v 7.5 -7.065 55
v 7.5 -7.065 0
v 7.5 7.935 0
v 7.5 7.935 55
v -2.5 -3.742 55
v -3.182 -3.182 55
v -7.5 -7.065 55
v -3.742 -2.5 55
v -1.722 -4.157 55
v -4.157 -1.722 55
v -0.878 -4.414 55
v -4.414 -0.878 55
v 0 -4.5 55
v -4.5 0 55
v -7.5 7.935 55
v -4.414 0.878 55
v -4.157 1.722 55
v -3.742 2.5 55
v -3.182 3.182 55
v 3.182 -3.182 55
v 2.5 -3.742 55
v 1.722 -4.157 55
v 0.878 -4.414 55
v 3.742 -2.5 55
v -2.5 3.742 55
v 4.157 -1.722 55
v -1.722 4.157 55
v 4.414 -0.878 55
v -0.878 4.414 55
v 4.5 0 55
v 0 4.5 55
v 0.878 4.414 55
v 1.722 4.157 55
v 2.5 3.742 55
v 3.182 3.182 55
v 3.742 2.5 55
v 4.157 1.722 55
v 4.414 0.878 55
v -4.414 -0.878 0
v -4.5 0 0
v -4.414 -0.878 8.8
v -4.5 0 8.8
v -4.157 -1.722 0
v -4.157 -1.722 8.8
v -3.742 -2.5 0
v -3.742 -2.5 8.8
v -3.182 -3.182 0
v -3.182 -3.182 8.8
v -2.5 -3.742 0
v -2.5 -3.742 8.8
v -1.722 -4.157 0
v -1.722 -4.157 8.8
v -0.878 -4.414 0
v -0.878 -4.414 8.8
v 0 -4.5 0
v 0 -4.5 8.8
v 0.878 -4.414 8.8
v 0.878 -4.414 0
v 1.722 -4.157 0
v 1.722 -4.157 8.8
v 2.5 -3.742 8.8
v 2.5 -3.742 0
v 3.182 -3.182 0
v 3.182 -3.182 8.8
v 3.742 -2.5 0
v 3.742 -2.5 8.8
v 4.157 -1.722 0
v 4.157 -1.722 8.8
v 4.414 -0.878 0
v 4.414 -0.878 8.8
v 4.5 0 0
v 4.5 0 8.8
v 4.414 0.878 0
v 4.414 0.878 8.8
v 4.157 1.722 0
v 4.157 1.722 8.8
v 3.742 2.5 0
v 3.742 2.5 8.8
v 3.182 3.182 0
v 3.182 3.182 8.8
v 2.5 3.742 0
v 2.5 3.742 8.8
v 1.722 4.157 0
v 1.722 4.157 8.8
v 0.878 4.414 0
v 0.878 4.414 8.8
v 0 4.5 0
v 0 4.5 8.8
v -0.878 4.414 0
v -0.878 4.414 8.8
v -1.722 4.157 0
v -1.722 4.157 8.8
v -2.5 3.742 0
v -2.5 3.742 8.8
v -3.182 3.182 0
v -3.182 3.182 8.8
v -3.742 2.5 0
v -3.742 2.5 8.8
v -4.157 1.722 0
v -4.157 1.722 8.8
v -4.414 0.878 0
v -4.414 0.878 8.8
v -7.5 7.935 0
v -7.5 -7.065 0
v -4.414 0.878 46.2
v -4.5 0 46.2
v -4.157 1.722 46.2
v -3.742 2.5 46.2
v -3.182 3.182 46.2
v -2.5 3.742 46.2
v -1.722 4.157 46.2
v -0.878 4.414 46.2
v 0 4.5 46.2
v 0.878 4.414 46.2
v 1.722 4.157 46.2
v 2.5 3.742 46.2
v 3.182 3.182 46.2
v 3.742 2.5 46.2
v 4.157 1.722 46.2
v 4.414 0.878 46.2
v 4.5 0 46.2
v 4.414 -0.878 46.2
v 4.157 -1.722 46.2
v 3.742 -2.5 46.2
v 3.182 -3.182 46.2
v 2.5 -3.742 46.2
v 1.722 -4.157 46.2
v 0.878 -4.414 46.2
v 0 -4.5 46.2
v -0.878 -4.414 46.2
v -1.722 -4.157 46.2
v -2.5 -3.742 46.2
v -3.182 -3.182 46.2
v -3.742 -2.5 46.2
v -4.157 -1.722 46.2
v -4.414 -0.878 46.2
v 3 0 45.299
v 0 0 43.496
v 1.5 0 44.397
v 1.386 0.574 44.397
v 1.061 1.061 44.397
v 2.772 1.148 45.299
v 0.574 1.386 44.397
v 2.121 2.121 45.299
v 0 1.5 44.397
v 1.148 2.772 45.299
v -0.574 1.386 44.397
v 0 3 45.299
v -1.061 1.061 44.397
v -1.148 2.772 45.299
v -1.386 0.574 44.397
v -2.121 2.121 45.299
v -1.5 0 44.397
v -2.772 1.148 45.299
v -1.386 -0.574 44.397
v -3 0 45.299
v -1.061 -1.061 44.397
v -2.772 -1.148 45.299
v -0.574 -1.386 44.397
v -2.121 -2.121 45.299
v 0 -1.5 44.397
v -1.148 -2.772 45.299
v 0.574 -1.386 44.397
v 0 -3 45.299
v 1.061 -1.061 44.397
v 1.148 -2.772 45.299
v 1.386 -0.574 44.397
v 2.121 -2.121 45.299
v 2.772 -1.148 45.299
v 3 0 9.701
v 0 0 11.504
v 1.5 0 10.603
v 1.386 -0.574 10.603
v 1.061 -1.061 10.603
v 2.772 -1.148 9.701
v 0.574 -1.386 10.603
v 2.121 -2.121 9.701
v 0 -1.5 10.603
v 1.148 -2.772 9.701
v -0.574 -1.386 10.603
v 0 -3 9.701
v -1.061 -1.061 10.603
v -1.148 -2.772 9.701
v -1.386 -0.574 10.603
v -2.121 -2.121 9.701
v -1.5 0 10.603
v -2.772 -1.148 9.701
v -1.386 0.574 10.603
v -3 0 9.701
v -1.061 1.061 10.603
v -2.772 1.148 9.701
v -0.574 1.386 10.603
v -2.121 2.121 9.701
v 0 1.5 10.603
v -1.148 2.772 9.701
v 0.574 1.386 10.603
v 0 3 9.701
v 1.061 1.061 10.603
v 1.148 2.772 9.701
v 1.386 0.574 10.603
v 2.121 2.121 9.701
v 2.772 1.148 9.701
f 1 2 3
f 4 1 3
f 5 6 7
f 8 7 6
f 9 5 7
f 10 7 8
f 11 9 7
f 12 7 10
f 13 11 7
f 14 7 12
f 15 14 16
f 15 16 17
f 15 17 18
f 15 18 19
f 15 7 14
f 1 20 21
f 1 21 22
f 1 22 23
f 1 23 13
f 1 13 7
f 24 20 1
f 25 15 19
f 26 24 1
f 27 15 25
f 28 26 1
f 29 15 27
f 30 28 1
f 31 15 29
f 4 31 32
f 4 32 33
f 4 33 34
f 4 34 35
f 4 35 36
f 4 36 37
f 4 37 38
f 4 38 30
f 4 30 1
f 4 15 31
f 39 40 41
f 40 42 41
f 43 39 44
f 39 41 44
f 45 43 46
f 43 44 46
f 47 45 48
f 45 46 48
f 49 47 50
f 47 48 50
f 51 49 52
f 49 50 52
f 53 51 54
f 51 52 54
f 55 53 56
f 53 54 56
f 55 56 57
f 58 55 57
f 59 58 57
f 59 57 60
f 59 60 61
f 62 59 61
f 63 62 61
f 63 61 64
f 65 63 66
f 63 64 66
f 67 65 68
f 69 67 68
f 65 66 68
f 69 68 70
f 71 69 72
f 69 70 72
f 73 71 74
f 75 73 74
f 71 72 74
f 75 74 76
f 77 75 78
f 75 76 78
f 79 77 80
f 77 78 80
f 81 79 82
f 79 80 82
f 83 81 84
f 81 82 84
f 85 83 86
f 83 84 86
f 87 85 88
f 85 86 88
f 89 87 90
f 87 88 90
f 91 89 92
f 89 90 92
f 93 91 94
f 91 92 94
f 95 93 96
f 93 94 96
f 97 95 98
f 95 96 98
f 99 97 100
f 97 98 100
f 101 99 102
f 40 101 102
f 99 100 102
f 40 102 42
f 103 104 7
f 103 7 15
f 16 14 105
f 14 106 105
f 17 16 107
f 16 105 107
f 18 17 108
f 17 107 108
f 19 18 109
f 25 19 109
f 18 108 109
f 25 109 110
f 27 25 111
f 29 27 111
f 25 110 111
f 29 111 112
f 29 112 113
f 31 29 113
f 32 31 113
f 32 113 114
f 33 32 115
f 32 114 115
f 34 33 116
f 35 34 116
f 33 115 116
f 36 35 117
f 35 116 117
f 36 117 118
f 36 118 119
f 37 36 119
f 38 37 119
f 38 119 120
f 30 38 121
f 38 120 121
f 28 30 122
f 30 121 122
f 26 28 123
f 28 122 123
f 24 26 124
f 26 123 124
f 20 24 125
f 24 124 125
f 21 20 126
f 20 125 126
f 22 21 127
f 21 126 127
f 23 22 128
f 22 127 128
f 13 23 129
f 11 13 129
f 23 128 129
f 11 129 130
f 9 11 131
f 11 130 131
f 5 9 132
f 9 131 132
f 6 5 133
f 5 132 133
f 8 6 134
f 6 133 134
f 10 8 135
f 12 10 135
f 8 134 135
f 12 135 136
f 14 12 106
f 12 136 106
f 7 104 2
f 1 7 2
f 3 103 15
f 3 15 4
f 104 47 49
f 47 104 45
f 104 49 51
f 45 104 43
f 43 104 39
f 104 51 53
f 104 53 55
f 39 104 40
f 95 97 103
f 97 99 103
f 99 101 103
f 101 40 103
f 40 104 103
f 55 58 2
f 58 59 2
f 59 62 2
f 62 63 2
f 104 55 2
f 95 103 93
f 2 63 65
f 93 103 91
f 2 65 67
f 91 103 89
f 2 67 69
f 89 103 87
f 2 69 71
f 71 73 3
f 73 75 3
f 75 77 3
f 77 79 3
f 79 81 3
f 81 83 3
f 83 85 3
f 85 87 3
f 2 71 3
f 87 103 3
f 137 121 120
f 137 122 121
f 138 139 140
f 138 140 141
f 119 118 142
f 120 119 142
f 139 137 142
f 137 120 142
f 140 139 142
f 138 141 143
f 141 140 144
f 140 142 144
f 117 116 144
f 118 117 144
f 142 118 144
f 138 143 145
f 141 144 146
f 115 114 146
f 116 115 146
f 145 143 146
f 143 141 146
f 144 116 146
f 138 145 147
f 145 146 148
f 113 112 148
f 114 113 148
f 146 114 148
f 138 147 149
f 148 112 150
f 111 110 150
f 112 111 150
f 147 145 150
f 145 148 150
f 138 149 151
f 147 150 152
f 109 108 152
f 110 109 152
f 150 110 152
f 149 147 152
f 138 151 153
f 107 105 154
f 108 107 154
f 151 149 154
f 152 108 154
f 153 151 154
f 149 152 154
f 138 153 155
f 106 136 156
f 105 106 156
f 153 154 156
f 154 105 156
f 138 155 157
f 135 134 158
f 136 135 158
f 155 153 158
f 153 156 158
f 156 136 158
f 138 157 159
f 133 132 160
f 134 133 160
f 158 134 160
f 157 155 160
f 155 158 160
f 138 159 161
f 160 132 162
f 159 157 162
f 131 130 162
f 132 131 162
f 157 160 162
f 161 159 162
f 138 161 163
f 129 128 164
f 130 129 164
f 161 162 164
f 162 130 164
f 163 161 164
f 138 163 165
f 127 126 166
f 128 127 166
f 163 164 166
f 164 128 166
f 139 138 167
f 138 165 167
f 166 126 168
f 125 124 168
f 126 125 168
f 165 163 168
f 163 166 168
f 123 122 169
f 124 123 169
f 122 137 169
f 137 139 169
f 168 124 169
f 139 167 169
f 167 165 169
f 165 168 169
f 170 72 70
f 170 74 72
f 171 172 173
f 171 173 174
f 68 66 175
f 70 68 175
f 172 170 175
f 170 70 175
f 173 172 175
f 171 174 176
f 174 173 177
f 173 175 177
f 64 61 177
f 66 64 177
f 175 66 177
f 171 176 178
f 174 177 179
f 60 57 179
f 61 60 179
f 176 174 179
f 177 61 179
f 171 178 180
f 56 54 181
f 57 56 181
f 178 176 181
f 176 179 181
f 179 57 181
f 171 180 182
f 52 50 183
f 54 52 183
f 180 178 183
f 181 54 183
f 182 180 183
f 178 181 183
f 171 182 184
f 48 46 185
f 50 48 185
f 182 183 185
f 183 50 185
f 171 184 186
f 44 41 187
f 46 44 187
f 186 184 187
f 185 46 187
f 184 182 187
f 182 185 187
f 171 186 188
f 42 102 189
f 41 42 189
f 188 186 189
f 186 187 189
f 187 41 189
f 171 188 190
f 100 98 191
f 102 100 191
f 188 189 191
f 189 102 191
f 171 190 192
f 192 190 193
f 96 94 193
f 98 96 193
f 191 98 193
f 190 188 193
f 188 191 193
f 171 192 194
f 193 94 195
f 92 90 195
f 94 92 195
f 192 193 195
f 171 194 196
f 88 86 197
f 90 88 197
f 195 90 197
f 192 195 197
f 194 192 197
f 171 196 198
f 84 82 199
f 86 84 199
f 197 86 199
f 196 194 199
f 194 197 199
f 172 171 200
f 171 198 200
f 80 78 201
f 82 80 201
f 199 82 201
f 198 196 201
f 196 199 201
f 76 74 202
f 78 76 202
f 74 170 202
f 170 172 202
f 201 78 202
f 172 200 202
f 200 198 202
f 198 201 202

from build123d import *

# Parameters (mm, degrees)
F0_W     = 15
F0_H     = 15
F1_DEPTH = 55
F4_D     = 9
F4_DEPTH = 8.8
F4_TIP   = 2.7038727856
F5_D     = 9
F5_DEPTH = 8.8
F5_TIP   = 2.7038727856


with BuildPart() as f1:
    # F0 (on Top) → F1 (new body)
    with BuildSketch(Plane.XY):
        with Locations((0, 0.4354127725)):
            Rectangle(F0_W, F0_H)
    extrude(amount=F1_DEPTH)

    # F4
    with Locations(Plane(origin=(0, 0, 0), x_dir=(1, 0, 0), z_dir=(0, 0, -1))):
        with Locations((0, 0)):
            Hole(F4_D / 2, depth=F4_DEPTH)
            with Locations((0, 0, -(F4_DEPTH + F4_TIP / 2))):  # 118° drill point
                Cone(0, F4_D / 2, F4_TIP, mode=Mode.SUBTRACT)

    # F5
    with Locations(Plane.XY.offset(55)):
        with Locations((0, 0)):
            Hole(F5_D / 2, depth=F5_DEPTH)
            with Locations((0, 0, -(F5_DEPTH + F5_TIP / 2))):  # 118° drill point
                Cone(0, F5_D / 2, F5_TIP, mode=Mode.SUBTRACT)


solid = f1.part
